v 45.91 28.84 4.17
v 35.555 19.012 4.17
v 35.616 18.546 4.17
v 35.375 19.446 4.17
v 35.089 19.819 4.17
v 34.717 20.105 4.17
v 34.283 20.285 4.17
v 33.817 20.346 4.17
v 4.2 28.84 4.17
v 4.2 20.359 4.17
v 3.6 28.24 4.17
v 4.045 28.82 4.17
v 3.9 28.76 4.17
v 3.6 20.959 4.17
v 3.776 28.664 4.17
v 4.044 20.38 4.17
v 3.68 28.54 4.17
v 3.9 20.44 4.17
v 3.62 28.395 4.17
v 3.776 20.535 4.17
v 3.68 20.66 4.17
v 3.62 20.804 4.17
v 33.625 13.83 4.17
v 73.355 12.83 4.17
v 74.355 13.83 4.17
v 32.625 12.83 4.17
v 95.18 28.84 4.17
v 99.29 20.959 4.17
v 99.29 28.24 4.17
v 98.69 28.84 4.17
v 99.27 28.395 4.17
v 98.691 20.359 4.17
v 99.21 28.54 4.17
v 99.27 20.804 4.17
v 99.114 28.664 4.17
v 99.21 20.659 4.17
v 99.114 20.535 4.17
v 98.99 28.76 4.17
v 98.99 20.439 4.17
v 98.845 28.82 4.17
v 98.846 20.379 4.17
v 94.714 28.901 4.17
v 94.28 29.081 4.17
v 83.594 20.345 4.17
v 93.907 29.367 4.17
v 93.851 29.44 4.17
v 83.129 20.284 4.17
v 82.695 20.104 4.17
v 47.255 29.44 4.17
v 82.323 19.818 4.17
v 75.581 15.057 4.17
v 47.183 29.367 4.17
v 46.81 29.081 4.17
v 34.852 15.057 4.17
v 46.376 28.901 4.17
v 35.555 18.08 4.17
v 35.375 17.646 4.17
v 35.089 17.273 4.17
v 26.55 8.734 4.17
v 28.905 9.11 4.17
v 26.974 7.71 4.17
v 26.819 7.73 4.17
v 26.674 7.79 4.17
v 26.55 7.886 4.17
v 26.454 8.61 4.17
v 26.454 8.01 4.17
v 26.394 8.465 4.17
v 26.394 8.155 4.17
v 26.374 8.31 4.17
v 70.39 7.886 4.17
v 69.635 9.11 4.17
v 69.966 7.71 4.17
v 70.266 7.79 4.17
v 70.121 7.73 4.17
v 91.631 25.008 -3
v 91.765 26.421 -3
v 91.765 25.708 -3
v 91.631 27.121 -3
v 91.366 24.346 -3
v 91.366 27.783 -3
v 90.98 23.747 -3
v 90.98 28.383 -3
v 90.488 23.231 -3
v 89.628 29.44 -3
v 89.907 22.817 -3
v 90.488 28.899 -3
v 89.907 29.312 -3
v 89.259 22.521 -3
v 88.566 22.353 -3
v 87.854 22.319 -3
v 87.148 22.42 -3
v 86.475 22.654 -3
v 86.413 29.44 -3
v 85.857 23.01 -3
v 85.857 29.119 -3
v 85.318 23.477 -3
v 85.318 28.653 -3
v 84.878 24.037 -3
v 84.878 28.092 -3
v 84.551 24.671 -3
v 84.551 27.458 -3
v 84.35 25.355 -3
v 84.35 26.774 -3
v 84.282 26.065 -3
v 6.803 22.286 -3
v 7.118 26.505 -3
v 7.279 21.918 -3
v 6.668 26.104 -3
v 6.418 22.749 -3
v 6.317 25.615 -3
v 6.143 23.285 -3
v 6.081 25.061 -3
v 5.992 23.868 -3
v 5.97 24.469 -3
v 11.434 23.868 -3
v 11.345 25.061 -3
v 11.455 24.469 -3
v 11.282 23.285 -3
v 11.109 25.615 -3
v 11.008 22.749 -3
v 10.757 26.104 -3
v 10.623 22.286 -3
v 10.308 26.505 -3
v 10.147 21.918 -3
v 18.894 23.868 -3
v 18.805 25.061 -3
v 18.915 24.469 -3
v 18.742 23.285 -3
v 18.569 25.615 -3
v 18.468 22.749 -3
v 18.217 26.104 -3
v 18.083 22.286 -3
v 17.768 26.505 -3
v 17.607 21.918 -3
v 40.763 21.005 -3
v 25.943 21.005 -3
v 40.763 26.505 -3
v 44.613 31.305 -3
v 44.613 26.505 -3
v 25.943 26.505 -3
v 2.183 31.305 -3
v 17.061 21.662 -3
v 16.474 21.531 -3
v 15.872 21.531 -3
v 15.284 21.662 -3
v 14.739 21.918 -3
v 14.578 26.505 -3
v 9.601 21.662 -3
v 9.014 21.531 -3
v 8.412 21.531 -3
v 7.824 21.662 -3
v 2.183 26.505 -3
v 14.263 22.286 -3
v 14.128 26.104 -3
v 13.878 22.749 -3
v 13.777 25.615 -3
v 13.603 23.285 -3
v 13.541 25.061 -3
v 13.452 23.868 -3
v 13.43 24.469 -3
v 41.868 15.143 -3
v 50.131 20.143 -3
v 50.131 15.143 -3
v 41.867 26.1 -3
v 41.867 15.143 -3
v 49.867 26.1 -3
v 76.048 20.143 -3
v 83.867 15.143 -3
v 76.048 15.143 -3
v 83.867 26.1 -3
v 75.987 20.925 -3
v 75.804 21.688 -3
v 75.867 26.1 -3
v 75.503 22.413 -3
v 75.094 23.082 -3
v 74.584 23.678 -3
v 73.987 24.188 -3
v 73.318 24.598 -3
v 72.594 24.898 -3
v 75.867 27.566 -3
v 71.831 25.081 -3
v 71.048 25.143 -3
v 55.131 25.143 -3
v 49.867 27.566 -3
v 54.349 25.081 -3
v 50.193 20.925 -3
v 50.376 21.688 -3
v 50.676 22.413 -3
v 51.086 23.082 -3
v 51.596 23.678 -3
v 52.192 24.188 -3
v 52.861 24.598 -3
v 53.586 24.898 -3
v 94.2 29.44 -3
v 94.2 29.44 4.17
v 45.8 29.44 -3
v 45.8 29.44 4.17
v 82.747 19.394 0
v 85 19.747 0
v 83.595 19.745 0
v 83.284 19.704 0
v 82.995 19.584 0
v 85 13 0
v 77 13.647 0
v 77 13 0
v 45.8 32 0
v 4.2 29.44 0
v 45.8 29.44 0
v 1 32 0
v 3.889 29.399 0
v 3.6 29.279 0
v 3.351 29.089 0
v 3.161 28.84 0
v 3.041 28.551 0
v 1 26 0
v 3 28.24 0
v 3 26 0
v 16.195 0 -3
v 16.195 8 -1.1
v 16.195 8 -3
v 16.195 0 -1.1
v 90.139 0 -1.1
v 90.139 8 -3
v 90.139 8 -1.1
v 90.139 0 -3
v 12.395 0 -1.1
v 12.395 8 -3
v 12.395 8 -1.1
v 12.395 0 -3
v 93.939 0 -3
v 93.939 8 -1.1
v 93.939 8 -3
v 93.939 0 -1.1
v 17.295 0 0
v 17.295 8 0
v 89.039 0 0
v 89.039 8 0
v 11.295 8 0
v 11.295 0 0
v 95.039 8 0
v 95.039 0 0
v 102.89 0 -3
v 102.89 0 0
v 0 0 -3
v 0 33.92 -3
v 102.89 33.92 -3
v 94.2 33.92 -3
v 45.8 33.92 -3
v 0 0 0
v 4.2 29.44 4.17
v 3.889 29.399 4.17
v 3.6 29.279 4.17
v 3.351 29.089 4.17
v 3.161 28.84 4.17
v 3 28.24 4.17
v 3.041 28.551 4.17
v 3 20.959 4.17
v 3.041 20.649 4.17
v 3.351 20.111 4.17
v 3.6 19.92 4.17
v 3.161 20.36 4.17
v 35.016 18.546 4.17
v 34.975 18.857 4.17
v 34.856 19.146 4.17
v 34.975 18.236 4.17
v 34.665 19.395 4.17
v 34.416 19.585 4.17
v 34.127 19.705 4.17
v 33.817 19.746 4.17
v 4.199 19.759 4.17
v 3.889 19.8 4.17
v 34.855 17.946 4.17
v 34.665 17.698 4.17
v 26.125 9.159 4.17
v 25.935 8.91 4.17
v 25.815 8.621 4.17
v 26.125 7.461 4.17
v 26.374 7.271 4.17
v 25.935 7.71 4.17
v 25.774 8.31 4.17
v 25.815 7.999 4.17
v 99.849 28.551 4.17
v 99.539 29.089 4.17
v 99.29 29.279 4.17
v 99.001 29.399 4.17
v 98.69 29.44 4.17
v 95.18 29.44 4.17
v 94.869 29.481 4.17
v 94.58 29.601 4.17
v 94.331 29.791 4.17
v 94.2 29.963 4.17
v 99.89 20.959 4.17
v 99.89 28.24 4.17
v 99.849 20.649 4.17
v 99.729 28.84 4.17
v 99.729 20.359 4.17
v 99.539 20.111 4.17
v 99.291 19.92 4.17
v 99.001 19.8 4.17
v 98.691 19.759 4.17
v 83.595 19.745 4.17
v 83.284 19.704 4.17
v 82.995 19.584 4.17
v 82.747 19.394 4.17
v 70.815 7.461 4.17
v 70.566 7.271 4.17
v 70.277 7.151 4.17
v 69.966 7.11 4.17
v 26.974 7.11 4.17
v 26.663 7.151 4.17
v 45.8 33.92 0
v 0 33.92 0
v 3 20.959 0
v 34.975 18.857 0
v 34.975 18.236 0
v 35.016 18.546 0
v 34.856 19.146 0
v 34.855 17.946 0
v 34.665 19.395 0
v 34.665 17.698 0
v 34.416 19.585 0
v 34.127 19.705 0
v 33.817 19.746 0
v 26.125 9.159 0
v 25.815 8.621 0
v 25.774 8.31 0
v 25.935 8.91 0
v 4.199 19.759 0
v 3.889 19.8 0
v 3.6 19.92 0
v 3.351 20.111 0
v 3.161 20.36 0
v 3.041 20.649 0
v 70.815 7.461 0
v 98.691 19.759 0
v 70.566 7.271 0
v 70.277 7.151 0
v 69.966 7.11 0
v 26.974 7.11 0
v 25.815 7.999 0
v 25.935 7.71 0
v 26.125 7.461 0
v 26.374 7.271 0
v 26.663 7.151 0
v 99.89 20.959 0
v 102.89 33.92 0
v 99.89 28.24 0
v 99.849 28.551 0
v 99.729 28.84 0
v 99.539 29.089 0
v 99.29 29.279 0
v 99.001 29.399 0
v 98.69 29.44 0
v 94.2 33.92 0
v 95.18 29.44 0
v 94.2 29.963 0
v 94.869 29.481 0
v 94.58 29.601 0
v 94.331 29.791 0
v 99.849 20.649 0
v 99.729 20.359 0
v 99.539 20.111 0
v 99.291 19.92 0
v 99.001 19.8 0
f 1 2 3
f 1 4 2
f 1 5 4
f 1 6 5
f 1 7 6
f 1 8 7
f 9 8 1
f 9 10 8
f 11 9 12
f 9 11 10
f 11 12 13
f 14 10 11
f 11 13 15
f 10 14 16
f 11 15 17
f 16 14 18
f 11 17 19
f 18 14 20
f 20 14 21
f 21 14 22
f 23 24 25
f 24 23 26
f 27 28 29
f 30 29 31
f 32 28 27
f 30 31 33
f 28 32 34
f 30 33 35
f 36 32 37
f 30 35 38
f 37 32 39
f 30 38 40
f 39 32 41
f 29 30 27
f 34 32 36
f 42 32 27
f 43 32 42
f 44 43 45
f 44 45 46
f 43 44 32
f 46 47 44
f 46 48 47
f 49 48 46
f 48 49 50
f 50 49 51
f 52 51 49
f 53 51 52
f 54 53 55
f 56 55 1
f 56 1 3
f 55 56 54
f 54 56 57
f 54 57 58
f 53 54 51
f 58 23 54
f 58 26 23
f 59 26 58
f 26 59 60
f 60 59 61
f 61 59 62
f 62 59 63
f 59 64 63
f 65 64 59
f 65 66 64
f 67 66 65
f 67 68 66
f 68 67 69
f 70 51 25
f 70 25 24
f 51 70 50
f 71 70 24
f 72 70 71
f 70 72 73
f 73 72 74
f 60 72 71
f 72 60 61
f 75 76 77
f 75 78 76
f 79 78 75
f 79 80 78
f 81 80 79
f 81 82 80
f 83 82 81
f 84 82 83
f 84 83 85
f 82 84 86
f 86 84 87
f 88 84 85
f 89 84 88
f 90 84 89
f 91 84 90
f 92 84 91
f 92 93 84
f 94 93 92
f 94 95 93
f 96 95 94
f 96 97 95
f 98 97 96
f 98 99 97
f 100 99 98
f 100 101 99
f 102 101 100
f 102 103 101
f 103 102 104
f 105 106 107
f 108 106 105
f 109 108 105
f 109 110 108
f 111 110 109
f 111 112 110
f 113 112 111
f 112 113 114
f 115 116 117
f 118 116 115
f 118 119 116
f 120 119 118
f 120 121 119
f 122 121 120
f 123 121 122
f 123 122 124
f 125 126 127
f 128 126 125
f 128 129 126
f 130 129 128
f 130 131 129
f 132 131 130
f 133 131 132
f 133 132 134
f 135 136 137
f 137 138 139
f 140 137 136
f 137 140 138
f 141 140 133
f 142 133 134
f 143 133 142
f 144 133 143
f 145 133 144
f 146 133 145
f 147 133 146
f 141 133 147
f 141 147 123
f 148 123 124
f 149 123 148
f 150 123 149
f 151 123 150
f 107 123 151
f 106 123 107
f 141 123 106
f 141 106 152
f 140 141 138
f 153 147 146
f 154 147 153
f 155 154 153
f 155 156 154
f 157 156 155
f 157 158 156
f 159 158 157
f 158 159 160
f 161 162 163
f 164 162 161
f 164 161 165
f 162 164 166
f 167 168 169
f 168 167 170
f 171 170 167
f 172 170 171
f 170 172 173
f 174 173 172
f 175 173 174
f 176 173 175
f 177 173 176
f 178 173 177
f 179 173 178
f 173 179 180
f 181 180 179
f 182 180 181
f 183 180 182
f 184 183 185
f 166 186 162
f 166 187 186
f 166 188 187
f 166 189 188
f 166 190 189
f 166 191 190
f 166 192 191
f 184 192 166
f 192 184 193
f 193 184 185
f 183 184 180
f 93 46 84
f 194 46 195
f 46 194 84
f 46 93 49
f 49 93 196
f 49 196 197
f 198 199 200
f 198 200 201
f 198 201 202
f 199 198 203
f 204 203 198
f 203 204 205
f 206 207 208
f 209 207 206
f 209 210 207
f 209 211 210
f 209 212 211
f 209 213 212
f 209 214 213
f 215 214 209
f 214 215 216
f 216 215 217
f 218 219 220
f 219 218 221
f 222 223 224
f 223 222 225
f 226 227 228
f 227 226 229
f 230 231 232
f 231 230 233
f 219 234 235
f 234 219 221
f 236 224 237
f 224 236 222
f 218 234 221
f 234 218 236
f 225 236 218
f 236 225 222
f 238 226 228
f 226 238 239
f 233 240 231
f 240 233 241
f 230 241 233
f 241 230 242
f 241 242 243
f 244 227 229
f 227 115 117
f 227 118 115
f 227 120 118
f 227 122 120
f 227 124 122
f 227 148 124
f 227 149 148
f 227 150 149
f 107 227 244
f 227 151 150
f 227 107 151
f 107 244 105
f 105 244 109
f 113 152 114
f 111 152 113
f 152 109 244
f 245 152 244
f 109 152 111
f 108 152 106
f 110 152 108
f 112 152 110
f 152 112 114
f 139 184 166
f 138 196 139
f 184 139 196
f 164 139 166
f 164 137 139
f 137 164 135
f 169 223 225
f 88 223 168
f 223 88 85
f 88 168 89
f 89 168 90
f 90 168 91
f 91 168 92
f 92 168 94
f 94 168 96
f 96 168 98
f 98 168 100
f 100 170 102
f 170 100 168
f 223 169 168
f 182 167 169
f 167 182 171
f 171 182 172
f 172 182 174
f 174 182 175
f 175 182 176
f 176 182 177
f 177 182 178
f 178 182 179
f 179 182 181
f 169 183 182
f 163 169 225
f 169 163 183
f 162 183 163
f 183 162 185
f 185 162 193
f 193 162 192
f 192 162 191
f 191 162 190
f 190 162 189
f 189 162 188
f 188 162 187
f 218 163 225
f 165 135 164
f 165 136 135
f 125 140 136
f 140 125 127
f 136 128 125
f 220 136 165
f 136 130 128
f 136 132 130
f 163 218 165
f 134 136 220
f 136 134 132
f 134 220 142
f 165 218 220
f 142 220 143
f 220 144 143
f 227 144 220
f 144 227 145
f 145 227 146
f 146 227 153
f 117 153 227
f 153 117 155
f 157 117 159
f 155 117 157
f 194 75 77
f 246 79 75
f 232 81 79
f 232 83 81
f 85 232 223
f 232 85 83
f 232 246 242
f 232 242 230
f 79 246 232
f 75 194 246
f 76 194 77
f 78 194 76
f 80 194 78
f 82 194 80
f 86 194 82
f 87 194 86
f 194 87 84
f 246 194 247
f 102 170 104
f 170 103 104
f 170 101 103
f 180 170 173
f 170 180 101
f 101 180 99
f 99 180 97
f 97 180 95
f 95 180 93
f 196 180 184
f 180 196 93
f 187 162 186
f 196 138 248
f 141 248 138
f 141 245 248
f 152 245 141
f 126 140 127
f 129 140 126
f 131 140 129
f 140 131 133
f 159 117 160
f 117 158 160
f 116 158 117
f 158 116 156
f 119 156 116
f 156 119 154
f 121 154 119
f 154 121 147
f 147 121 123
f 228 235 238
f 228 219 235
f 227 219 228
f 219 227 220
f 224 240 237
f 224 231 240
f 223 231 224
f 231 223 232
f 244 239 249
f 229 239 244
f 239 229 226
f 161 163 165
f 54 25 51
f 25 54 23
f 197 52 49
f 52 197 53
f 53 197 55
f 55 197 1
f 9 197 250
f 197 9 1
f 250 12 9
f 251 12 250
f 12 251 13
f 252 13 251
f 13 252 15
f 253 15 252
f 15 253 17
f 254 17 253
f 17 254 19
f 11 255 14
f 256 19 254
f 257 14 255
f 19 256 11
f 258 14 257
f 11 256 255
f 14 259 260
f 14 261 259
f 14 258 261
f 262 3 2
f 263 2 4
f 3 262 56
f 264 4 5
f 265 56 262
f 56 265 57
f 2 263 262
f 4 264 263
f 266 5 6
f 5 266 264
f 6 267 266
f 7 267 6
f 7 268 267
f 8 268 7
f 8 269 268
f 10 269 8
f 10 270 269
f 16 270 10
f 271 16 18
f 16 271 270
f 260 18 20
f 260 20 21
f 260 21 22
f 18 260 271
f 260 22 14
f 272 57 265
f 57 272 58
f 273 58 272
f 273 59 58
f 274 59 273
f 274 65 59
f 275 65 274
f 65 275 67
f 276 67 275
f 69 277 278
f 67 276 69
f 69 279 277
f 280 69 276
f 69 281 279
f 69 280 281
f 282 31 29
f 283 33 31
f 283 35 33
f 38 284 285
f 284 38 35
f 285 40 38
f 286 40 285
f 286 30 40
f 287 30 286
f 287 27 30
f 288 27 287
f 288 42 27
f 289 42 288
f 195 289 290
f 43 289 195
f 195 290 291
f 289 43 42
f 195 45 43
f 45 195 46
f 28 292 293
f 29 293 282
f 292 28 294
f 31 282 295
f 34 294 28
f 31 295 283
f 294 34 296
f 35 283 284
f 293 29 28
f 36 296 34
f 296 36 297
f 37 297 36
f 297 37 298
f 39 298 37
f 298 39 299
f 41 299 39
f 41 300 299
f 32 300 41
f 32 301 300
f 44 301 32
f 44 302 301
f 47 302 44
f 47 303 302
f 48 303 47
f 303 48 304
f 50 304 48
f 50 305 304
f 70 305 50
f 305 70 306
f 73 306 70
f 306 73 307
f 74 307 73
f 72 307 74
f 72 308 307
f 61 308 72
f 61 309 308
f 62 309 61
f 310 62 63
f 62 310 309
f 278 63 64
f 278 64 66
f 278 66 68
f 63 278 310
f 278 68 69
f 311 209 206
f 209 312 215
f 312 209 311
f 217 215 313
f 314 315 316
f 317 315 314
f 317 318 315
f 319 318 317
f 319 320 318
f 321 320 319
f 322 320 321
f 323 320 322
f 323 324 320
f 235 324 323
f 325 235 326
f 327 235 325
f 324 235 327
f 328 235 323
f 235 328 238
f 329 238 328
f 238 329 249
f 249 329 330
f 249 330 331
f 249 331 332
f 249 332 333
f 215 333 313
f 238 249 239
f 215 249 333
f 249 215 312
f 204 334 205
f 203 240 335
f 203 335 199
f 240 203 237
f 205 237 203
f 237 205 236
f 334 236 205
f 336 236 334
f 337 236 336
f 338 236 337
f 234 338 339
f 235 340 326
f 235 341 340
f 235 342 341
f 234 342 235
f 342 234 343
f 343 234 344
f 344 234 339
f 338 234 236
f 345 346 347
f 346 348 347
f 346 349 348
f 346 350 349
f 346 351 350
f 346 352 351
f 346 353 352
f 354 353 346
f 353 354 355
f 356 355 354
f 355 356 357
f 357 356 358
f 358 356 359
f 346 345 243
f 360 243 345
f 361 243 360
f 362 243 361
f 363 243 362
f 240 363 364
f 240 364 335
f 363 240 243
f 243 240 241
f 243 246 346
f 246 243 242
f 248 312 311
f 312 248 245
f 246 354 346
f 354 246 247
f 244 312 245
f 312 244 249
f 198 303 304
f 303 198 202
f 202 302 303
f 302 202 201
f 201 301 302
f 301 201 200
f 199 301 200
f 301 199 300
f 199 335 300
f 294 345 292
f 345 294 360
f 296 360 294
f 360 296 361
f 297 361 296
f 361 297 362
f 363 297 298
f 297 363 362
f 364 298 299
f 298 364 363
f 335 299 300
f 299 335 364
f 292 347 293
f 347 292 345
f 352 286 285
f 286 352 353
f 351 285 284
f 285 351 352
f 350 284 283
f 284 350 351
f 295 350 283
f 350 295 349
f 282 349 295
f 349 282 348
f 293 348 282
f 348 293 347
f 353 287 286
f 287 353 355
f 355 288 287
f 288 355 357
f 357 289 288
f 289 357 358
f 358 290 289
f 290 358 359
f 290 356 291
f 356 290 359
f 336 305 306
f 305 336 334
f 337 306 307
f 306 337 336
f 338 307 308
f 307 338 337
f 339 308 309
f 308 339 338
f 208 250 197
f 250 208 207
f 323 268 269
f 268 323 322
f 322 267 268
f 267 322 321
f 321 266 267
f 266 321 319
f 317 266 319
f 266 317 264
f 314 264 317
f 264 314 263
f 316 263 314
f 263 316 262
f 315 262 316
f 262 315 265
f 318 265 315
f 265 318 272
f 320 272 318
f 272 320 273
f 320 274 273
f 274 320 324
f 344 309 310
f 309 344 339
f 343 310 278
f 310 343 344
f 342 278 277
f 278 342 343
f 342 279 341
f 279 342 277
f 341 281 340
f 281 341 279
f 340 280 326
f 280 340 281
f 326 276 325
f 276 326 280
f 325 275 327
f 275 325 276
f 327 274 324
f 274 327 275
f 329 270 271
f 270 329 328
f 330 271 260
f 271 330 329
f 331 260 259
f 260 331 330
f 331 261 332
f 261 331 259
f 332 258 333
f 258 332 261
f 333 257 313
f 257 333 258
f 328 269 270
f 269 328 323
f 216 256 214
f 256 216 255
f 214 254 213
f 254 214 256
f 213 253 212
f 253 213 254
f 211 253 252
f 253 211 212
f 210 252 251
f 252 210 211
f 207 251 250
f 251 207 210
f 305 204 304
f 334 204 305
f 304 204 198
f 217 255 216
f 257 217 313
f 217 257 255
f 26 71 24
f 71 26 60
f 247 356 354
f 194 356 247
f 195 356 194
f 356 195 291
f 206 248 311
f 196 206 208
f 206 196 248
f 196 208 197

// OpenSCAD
HEIGHT=7.17;
FOO = 0.585;

difference() {
    union() {
        import("obj/Atari_ST_Gotek_Mount_for_Slant_Type_-_Face.3mf");

        translate([0, 0, FOO]) {
            translate([51.5, 24.6, 0]) {
                cube([96,8.8,HEIGHT],center=true);
            }

            translate([51.5, 26.940, 0]) {
                cube([92,5,HEIGHT],center=true);
            }

            translate([37,20,0]) {
                rotate(35) {
                    cube([4.1,5,HEIGHT],center=true);
                }
            }

            translate([81,17,-2.085]) {
                cube([8,8,3],center=true);
            }

            translate([25,29,-2.085]) {
                cube([48,6,3],center=true);
            }

            difference() {
                linear_extrude(HEIGHT, center=true) {
                    polygon([[25,7.2],[70,7.3],[88,25],[37,20]]);
                }
                translate([24.3,7,0]) {
                    rotate(36) {
                        cube([4,5,HEIGHT+1],center=true);
                    }
                }
            }
        }
    }

    translate([70, 32.34, FOO]) {
        cube([48.4,5.8,HEIGHT+1], center=true);
    }
}
